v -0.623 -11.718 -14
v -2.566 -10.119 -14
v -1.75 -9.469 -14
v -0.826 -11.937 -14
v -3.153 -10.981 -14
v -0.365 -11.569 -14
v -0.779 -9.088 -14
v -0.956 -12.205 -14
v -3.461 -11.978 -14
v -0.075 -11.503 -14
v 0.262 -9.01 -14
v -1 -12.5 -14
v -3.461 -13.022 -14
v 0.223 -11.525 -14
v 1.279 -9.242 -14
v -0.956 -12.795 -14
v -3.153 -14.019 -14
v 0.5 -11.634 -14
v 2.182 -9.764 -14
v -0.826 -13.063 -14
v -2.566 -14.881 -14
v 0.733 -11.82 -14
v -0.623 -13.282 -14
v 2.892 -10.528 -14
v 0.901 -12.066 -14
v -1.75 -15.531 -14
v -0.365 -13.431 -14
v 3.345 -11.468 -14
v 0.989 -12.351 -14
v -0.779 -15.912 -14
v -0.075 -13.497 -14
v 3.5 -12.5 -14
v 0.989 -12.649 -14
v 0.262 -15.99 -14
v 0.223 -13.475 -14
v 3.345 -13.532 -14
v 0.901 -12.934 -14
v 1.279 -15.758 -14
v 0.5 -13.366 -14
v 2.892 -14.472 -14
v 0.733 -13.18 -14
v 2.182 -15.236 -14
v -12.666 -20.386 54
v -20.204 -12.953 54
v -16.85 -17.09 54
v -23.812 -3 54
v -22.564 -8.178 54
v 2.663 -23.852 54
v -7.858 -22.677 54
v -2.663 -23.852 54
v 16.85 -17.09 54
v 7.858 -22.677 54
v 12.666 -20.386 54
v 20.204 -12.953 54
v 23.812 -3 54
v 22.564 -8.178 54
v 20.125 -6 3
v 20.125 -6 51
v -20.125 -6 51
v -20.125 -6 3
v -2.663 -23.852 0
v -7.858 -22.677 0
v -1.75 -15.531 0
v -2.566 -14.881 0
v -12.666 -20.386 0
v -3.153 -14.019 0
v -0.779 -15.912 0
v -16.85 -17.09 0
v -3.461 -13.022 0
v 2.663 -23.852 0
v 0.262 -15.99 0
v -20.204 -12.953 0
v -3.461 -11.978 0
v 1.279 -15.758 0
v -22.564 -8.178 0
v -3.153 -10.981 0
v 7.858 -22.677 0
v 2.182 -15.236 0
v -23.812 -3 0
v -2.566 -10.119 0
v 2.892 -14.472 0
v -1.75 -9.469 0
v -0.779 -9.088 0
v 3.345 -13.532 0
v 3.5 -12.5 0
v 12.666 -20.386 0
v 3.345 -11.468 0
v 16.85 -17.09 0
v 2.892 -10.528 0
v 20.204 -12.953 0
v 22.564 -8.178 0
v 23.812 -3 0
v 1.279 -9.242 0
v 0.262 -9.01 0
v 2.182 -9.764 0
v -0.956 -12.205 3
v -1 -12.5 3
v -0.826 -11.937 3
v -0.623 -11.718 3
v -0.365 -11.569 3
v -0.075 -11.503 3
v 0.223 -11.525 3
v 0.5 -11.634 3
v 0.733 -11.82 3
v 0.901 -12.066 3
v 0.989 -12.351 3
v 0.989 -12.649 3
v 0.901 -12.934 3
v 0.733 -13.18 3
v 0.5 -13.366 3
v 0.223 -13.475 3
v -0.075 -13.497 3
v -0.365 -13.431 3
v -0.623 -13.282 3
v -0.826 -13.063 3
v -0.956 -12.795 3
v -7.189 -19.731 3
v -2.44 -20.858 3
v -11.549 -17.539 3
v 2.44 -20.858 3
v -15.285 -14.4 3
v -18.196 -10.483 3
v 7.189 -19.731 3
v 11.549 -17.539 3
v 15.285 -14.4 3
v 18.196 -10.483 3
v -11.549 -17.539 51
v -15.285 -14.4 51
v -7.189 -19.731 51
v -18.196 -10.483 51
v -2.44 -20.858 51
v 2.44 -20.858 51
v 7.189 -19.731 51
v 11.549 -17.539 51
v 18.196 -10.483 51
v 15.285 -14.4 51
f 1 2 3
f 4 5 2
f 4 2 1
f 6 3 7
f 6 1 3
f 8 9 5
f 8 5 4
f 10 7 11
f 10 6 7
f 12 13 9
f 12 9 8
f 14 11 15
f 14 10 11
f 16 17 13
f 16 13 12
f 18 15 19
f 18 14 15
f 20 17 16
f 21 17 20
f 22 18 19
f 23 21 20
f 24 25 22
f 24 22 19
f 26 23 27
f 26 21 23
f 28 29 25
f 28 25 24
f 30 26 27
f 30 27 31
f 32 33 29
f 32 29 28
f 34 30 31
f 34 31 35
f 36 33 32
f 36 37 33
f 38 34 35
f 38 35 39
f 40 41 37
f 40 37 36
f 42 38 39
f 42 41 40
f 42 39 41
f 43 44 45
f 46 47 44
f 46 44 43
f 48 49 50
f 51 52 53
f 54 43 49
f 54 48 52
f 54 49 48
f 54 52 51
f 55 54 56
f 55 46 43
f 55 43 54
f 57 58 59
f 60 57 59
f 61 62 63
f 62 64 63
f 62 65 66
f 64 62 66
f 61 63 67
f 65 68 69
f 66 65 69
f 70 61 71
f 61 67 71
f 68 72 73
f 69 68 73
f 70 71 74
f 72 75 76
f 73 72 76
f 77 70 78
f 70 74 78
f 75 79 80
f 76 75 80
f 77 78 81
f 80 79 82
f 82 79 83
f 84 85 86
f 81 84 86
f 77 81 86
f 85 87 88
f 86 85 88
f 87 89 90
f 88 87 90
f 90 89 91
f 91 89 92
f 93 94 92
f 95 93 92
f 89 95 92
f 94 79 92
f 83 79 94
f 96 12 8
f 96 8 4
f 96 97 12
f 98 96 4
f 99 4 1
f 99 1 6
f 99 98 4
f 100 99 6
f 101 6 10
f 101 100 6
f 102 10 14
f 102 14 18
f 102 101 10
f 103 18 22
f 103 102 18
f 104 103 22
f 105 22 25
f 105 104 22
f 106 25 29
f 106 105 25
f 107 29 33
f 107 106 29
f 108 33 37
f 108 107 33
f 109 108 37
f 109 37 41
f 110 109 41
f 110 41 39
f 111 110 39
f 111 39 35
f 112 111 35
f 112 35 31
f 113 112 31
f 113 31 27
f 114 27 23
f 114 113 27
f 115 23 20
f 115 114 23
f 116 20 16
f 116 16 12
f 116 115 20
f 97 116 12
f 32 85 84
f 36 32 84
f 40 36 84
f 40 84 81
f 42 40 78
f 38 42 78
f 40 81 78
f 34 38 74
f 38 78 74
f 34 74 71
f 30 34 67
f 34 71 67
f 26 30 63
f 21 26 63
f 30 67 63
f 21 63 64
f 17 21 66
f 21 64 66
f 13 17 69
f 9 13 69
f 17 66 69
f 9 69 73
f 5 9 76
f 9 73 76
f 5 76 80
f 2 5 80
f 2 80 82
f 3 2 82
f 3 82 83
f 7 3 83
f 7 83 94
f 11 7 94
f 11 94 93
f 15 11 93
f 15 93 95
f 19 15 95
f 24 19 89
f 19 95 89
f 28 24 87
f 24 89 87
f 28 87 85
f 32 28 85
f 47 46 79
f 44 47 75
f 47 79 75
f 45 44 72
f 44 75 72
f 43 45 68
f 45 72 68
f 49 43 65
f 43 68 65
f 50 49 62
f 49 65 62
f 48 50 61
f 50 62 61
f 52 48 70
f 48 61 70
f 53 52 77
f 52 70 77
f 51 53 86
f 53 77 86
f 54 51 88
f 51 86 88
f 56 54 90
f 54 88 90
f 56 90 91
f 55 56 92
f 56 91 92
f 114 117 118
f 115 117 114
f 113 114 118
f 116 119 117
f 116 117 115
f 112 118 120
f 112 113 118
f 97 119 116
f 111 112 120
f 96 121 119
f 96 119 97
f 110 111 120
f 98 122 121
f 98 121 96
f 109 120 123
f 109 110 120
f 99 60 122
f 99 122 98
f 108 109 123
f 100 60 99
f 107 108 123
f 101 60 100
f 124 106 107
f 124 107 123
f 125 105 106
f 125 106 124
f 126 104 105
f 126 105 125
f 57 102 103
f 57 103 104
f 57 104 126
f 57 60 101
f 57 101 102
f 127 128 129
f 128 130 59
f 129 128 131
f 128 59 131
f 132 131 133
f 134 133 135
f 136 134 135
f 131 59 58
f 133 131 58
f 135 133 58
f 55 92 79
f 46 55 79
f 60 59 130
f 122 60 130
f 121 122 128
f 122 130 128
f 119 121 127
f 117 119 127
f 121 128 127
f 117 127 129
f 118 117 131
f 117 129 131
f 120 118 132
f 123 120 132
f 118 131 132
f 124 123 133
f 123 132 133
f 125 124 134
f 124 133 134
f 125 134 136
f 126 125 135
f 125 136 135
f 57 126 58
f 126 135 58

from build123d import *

# Parameters (mm, degrees)
SKETCH1_R           = 24
BOSS_EXTRUDE1_DEPTH = 54
SKETCH2_W           = 90.000197778
SKETCH2_H           = 36.253247866
CUT_EXTRUDE1_DEPTH  = 64.780874876
SKETCH3_R           = 3.5
SKETCH3_R_2         = 1
BOSS_EXTRUDE2_DEPTH = 14
CUT_EXTRUDE2_DEPTH  = 48
CUT_EXTRUDE3_START  = -3
SKETCH5_R           = 1
CUT_EXTRUDE3_DEPTH  = 3


with BuildPart() as part:
    # Sketch1 → Boss-Extrude1 (new body)
    with BuildSketch(Plane.XY):
        Circle(SKETCH1_R)
    extrude(amount=BOSS_EXTRUDE1_DEPTH)

    # Sketch2 → Cut-Extrude1 (cut, through all)
    with BuildSketch(Plane(origin=(0, 0, 0), x_dir=(-1, 0, 0), z_dir=(0, 0, -1))):
        with Locations((-2.008073343, 15.126623933)):
            Rectangle(SKETCH2_W, SKETCH2_H)
    extrude(amount=-CUT_EXTRUDE1_DEPTH, mode=Mode.SUBTRACT)

    # Sketch3 → Boss-Extrude2 (add)
    with BuildSketch(Plane(origin=(0, 0, 0), x_dir=(-1, 0, 0), z_dir=(0, 0, -1))):
        with Locations(Location((0, -12.5, 0), (0, 0, 180))):
            Circle(SKETCH3_R)
        with Locations((0, -12.5)):
            Circle(SKETCH3_R_2, mode=Mode.SUBTRACT)
    extrude(amount=BOSS_EXTRUDE2_DEPTH)

    # Sketch4 → Cut-Extrude2 (cut)
    with BuildSketch(Plane.XY.offset(51)):
        with BuildLine():
            Line((20.124611797, -6), (-20.124611797, -6))
            ThreePointArc((-20.124611797, -6), (0, -21), (20.124611797, -6))
        make_face()
    extrude(amount=-CUT_EXTRUDE2_DEPTH, mode=Mode.SUBTRACT)

    # Sketch5 → Cut-Extrude3 (cut)
    with BuildSketch(Plane(origin=(0, 0, 0), x_dir=(-1, 0, 0), z_dir=(0, 0, -1)).offset(CUT_EXTRUDE3_START)):
        with Locations((0, -12.5)):
            Circle(SKETCH5_R)
    extrude(amount=CUT_EXTRUDE3_DEPTH, mode=Mode.SUBTRACT)


solid = part.part
